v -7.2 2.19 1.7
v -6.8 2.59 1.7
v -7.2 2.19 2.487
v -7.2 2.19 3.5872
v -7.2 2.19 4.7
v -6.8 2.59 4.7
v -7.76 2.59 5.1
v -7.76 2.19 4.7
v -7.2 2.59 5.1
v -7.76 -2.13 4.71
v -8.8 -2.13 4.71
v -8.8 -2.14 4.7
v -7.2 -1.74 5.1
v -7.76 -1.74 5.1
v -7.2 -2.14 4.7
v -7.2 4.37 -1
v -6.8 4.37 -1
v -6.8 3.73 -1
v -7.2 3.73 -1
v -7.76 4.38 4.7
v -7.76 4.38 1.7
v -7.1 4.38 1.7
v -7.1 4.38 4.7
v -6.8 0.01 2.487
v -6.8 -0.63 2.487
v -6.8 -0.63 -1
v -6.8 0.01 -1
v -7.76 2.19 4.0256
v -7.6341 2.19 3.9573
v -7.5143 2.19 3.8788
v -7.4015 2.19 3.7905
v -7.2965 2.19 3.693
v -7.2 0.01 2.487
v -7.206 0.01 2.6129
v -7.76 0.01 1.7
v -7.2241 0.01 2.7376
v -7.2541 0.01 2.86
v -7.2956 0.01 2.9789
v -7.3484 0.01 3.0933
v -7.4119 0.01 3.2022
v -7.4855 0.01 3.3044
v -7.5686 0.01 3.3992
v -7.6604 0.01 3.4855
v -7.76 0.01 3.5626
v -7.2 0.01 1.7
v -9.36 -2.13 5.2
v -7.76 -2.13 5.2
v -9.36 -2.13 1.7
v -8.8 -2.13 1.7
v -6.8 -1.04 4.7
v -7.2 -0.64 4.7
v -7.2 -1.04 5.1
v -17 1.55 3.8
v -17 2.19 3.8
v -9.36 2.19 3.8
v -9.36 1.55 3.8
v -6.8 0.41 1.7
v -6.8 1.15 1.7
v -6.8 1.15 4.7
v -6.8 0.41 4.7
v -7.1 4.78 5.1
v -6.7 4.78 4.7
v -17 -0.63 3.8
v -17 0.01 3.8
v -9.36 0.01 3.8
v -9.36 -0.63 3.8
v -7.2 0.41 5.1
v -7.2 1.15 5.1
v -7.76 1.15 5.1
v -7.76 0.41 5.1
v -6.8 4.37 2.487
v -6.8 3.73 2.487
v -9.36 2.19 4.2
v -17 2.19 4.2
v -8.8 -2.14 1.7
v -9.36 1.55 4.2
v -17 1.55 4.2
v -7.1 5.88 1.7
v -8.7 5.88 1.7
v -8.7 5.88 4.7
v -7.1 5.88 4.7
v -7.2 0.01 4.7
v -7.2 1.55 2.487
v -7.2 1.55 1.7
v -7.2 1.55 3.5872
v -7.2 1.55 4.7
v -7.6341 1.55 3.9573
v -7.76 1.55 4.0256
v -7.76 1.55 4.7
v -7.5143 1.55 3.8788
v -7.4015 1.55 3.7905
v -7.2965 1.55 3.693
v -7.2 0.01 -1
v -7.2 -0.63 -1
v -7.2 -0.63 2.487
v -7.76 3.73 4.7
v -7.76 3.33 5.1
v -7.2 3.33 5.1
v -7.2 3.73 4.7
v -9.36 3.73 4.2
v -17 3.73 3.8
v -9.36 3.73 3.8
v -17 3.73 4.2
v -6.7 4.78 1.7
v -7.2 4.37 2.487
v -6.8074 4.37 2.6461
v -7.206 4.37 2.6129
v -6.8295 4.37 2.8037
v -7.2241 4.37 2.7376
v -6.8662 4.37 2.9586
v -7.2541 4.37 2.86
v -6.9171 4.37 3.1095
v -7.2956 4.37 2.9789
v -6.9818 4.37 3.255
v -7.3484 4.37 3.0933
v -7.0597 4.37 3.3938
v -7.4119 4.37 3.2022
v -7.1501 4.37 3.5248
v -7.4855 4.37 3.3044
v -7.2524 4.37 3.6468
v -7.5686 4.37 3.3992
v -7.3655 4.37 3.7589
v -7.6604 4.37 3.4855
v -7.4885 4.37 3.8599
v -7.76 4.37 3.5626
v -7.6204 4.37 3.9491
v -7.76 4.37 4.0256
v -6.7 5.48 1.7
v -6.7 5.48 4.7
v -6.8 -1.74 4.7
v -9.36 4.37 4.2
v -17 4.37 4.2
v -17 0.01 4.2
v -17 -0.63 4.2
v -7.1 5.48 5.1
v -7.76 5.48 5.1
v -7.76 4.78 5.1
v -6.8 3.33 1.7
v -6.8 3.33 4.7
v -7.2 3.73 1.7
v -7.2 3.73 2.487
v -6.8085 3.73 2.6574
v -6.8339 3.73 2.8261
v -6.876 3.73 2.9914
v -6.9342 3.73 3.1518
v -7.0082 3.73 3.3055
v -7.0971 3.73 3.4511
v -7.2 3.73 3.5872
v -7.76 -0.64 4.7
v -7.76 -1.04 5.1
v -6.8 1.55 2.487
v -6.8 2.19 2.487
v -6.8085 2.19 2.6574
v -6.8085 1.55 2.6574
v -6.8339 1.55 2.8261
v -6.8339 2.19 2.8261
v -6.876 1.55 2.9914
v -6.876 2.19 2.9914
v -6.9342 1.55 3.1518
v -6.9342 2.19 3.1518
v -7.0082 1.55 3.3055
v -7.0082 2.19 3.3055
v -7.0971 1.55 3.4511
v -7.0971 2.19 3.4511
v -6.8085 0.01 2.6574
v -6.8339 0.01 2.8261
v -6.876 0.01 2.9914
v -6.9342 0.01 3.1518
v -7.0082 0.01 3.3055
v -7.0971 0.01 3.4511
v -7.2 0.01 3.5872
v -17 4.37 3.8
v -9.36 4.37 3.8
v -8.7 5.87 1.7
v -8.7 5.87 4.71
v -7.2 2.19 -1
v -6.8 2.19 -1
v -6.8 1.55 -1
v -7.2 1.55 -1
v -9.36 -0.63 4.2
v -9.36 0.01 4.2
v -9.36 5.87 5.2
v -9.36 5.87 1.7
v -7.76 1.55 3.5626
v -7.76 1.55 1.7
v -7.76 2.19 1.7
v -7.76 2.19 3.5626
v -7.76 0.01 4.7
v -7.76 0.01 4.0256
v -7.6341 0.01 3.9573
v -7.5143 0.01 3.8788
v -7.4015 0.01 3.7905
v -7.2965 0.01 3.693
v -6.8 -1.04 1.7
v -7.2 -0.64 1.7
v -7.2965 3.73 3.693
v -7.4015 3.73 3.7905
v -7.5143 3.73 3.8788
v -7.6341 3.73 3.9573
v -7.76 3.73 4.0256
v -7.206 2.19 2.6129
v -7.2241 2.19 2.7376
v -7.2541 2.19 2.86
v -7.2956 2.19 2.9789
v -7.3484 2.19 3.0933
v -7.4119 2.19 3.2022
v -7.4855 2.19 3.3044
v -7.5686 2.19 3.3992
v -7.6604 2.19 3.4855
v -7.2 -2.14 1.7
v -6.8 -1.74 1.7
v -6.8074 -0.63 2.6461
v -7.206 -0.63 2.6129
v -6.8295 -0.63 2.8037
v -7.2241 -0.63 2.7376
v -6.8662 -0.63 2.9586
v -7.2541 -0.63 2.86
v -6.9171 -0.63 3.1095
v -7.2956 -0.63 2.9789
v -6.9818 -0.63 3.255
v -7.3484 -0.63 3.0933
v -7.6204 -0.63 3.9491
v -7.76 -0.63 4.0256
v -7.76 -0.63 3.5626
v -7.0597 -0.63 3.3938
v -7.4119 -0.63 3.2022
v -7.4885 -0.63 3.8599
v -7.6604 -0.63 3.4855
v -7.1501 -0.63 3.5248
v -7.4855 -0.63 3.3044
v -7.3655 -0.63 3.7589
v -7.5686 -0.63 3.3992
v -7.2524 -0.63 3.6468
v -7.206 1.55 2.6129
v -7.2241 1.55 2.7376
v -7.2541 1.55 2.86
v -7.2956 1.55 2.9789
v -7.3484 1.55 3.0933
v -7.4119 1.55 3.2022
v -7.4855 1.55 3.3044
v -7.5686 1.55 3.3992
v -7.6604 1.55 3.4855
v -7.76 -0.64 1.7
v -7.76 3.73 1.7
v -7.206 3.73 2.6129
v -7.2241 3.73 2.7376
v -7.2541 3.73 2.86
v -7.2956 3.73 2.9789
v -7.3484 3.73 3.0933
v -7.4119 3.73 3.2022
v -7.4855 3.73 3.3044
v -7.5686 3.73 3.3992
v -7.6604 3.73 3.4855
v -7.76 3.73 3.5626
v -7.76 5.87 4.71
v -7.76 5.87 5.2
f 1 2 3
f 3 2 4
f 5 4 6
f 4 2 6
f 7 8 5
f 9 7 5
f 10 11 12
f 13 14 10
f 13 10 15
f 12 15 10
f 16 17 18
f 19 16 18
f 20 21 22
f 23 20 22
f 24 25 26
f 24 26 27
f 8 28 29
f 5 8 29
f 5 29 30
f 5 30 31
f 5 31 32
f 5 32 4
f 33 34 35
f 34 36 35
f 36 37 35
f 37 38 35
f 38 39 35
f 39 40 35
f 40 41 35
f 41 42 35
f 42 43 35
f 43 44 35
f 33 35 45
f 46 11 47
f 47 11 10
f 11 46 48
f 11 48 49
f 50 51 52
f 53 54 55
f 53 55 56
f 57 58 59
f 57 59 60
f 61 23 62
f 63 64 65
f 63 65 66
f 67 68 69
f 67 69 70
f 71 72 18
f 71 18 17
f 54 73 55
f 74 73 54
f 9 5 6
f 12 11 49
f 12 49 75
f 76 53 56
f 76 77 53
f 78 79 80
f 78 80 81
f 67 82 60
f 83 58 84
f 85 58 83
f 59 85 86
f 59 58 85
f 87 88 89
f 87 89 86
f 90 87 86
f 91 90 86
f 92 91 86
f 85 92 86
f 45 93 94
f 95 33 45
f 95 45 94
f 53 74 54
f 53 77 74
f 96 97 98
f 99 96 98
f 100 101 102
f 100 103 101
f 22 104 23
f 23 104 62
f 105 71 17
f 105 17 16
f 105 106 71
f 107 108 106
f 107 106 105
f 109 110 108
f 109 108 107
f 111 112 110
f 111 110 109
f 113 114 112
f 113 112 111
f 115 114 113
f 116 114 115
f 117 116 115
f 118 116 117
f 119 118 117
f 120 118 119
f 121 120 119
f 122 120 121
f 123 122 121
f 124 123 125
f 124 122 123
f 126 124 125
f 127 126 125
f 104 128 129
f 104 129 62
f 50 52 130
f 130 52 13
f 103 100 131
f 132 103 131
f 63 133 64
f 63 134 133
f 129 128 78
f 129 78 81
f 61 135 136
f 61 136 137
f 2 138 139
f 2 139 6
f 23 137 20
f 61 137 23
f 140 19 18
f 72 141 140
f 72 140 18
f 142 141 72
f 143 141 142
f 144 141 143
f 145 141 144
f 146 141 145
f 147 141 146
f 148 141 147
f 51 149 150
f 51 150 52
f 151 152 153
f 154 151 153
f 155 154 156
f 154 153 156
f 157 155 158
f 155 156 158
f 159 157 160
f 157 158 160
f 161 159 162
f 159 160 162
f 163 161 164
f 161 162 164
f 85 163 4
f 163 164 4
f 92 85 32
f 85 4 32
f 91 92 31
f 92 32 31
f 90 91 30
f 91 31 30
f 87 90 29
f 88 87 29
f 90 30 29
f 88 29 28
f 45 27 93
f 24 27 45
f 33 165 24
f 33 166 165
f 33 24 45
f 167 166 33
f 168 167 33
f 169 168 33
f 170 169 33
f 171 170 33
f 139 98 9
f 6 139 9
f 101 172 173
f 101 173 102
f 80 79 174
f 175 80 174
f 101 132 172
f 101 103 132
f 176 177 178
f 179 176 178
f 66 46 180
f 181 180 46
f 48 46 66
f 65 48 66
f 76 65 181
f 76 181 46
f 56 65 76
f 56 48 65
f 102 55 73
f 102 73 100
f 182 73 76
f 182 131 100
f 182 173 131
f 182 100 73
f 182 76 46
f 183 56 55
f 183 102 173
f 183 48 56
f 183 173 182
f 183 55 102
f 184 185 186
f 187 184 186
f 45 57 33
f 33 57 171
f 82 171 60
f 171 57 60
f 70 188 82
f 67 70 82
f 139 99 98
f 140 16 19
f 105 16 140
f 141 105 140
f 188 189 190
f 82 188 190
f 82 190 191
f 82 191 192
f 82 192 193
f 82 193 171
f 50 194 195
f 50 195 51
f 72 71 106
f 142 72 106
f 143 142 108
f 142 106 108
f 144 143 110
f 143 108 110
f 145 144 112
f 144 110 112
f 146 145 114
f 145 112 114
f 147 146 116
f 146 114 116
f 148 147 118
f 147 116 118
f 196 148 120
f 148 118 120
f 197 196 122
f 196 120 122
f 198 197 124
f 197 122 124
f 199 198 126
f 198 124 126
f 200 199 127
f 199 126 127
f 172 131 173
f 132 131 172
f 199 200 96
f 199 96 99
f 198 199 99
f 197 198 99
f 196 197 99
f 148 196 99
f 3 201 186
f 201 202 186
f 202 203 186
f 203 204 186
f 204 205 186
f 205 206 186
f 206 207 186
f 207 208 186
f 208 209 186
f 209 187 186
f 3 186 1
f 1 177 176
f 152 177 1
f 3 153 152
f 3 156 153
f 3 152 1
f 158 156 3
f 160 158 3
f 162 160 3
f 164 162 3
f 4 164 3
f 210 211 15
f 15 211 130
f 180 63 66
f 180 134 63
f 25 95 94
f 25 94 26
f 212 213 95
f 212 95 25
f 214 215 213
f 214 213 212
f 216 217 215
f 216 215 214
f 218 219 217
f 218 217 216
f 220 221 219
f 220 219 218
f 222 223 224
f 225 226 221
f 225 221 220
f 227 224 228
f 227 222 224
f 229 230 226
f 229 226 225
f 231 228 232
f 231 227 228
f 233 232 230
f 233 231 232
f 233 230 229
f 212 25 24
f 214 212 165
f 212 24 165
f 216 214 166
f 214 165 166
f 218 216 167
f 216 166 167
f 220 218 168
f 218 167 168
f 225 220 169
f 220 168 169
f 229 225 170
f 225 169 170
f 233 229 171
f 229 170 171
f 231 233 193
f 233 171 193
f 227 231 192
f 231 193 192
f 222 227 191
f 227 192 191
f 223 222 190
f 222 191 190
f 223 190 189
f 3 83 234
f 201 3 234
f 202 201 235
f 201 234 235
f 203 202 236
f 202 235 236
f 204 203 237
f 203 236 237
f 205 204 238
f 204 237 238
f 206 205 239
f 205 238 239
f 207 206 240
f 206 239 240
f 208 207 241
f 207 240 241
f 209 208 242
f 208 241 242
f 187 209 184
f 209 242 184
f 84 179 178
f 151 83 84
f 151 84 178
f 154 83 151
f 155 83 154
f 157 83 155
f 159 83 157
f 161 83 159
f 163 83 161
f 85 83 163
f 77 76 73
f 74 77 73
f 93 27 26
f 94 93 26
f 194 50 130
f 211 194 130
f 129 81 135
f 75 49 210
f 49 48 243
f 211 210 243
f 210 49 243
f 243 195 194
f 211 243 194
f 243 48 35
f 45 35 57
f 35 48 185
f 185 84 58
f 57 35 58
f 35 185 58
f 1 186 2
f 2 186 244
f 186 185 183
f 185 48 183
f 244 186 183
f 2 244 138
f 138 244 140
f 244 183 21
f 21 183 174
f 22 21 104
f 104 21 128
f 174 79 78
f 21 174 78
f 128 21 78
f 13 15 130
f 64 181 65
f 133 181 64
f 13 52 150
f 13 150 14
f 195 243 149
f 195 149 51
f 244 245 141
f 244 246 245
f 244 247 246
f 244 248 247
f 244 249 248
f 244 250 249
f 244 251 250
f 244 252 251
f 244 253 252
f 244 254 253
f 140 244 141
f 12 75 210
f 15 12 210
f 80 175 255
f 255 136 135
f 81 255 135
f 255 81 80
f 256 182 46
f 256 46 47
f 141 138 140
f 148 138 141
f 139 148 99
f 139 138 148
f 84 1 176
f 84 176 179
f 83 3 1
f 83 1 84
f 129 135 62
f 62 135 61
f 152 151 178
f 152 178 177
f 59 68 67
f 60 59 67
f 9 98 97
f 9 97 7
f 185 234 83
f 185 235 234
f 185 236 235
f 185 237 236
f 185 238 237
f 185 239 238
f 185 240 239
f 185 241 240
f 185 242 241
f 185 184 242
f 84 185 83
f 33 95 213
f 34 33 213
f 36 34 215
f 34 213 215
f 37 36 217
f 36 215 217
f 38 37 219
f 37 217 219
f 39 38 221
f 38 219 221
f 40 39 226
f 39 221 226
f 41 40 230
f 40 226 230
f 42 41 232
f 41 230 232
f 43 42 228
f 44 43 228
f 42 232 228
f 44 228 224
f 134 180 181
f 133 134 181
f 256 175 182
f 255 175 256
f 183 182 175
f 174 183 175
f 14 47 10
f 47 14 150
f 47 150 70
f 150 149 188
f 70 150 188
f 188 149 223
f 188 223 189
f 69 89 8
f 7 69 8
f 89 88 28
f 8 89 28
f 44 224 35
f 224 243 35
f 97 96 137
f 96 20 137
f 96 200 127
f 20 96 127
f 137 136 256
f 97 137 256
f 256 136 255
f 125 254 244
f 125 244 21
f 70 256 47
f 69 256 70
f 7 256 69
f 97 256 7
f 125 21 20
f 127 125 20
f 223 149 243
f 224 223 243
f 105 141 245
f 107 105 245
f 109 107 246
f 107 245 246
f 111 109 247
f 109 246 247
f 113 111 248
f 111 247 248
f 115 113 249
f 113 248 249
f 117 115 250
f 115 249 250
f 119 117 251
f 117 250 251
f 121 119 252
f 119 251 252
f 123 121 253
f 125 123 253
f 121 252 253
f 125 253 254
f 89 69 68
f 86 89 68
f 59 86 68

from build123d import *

# Parameters (mm, degrees)
BOX004_W                  = 1.6
BOX004_H                  = 8
BOX004_DEPTH              = 3.5
BOX003_W                  = 1.54
BOX003_H                  = 2
BOX003_DEPTH              = 3.4
CHAMFER002_SIZE           = 0.4
BOX002_W                  = 1.5
BOX002_H                  = 2
BOX002_DEPTH              = 3.4
CHAMFER001_SIZE           = 0.4
BOX_W                     = 1.54
BOX_H                     = 2
BOX_DEPTH                 = 3.4
CHAMFER003_SIZE           = 0.4
BOX001_W                  = 1.5
BOX001_H                  = 2
BOX001_DEPTH              = 3.4
CHAMFER_SIZE              = 0.4
SKETCH001_W               = 0.64
SKETCH001_H               = 0.4
ARRAY_X_COUNT             = 3
ARRAY_X_PITCH             = 2.18
FUSION001_PLACEMENT_ANGLE = -90


with BuildPart() as cubo008:
    # Box004 → Box004 (new body)
    with BuildSketch(Plane(origin=(-9.36, -4.13, 1.7), x_dir=(1, 0, 0), z_dir=(0, 0, 1))):
        with Locations((0.8, 4)):
            Rectangle(BOX004_W, BOX004_H)
    extrude(amount=BOX004_DEPTH)


with BuildPart() as chamfer002:
    # Box003 → Box003 (new body)
    with BuildSketch(Plane(origin=(-2.93, -3.3, 0.2), x_dir=(1, 0, 0), z_dir=(0, 0, 1))):
        with Locations((0.77, 1)):
            Rectangle(BOX003_W, BOX003_H)
    extrude(amount=BOX003_DEPTH)

    # Chamfer002
    chamfer002_edges = [chamfer002.edges().sort_by_distance(p)[0] for p in [
        (-2.93, -2.3, 3.6),
        (-2.93, -1.3, 1.9),
        (-1.39, -2.3, 3.6),
        (-1.39, -1.3, 1.9),
        (-2.16, -1.3, 3.6),
    ]]
    chamfer(chamfer002_edges, length=CHAMFER002_SIZE)


with BuildPart() as chamfer002_1:
    # Chamfer002 placement: moved
    add(chamfer002.part.moved(Location((3.2, 1.5, 1.5))))


with BuildPart() as chamfer001:
    # Box002 → Box002 (new body)
    with BuildSketch(Plane(origin=(-1.14, -16.5, 1.4), x_dir=(1, 0, 0), z_dir=(0, 0, 1))):
        with Locations((0.75, 1)):
            Rectangle(BOX002_W, BOX002_H)
    extrude(amount=BOX002_DEPTH)

    # Chamfer001
    chamfer001_edges = [chamfer001.edges().sort_by_distance(p)[0] for p in [
        (-1.14, -15.5, 4.8),
        (-1.14, -14.5, 3.1),
        (0.36, -15.5, 4.8),
        (0.36, -14.5, 3.1),
        (-0.39, -14.5, 4.8),
    ]]
    chamfer(chamfer001_edges, length=CHAMFER001_SIZE)


with BuildPart() as chamfer001_1:
    # Chamfer001 placement: moved
    add(chamfer001.part.moved(Location((5.78, 14.7, 0.3))))


with BuildPart() as chamfer003:
    # Box → Box (new body)
    with BuildSketch(Plane(origin=(-2.93, -3.3, 0.2), x_dir=(1, 0, 0), z_dir=(0, 0, 1))):
        with Locations((0.77, 1)):
            Rectangle(BOX_W, BOX_H)
    extrude(amount=BOX_DEPTH)

    # Chamfer003
    chamfer003_edges = [chamfer003.edges().sort_by_distance(p)[0] for p in [
        (-2.93, -2.3, 3.6),
        (-2.93, -1.3, 1.9),
        (-1.39, -2.3, 3.6),
        (-1.39, -1.3, 1.9),
        (-2.16, -1.3, 3.6),
    ]]
    chamfer(chamfer003_edges, length=CHAMFER003_SIZE)


with BuildPart() as chamfer003_1:
    # Chamfer003 placement: moved
    add(chamfer003.part.moved(Location((5.38, 1.5, 1.5))))


with BuildPart() as chamfer_body:
    # Box001 → Box001 (new body)
    with BuildSketch(Plane(origin=(-1.14, -16.5, 1.4), x_dir=(1, 0, 0), z_dir=(0, 0, 1))):
        with Locations((0.75, 1)):
            Rectangle(BOX001_W, BOX001_H)
    extrude(amount=BOX001_DEPTH)

    # Chamfer
    chamfer_edges = [chamfer_body.edges().sort_by_distance(p)[0] for p in [
        (-1.14, -15.5, 4.8),
        (-1.14, -14.5, 3.1),
        (0.36, -15.5, 4.8),
        (0.36, -14.5, 3.1),
        (-0.39, -14.5, 4.8),
    ]]
    chamfer(chamfer_edges, length=CHAMFER_SIZE)


with BuildPart() as chamfer_body_1:
    # Chamfer placement: moved
    add(chamfer_body.part.moved(Location((-0.74, 14.8, 0.3))))


with BuildPart() as conectores:
    # Sweep: sweep along a path in Sketch
    with BuildLine(Plane.YZ) as sweep_path:
        Line((0, 0), (0, 3.48702))
        ThreePointArc((0, 3.48702), (-0.443142, 4.556858), (-1.51298, 5))
        Line((-1.51298, 5), (-10, 5))
    # Sketch001 → Sweep (sweep)
    with BuildSketch(Plane.XY):
        Rectangle(SKETCH001_W, SKETCH001_H)
    sweep(path=sweep_path.line)


with BuildPart() as conectores_1:
    # Sweep placement: moved
    add(conectores.part.moved(Location((-0.05, 0, -1))))

    # Array X: Conectores ×3


with BuildPart() as conectores_2:
    add(conectores_1.part)
    with Locations(*[(i * ARRAY_X_PITCH, 0, 0) for i in range(1, ARRAY_X_COUNT)]):
        add(conectores_1.part)

    # Fusion001: union Chamfer002, Chamfer001, Chamfer003, Chamfer body
    add(chamfer002_1.part)
    add(chamfer001_1.part)
    add(chamfer003_1.part)
    add(chamfer_body_1.part)


with BuildPart() as conectores_3:
    # Fusion001 placement: moved
    add(conectores_2.part.moved(Location((-7, 2, 0))).rotate(Axis((-7, 2, 0), (0, 0, 1)), FUSION001_PLACEMENT_ANGLE))

    # Fusion: union Cubo008
    add(cubo008.part)


with BuildPart() as conectores_4:
    # Fusion placement: moved
    add(conectores_3.part.moved(Location((0, 2, 0))))


solid = conectores_4.part
